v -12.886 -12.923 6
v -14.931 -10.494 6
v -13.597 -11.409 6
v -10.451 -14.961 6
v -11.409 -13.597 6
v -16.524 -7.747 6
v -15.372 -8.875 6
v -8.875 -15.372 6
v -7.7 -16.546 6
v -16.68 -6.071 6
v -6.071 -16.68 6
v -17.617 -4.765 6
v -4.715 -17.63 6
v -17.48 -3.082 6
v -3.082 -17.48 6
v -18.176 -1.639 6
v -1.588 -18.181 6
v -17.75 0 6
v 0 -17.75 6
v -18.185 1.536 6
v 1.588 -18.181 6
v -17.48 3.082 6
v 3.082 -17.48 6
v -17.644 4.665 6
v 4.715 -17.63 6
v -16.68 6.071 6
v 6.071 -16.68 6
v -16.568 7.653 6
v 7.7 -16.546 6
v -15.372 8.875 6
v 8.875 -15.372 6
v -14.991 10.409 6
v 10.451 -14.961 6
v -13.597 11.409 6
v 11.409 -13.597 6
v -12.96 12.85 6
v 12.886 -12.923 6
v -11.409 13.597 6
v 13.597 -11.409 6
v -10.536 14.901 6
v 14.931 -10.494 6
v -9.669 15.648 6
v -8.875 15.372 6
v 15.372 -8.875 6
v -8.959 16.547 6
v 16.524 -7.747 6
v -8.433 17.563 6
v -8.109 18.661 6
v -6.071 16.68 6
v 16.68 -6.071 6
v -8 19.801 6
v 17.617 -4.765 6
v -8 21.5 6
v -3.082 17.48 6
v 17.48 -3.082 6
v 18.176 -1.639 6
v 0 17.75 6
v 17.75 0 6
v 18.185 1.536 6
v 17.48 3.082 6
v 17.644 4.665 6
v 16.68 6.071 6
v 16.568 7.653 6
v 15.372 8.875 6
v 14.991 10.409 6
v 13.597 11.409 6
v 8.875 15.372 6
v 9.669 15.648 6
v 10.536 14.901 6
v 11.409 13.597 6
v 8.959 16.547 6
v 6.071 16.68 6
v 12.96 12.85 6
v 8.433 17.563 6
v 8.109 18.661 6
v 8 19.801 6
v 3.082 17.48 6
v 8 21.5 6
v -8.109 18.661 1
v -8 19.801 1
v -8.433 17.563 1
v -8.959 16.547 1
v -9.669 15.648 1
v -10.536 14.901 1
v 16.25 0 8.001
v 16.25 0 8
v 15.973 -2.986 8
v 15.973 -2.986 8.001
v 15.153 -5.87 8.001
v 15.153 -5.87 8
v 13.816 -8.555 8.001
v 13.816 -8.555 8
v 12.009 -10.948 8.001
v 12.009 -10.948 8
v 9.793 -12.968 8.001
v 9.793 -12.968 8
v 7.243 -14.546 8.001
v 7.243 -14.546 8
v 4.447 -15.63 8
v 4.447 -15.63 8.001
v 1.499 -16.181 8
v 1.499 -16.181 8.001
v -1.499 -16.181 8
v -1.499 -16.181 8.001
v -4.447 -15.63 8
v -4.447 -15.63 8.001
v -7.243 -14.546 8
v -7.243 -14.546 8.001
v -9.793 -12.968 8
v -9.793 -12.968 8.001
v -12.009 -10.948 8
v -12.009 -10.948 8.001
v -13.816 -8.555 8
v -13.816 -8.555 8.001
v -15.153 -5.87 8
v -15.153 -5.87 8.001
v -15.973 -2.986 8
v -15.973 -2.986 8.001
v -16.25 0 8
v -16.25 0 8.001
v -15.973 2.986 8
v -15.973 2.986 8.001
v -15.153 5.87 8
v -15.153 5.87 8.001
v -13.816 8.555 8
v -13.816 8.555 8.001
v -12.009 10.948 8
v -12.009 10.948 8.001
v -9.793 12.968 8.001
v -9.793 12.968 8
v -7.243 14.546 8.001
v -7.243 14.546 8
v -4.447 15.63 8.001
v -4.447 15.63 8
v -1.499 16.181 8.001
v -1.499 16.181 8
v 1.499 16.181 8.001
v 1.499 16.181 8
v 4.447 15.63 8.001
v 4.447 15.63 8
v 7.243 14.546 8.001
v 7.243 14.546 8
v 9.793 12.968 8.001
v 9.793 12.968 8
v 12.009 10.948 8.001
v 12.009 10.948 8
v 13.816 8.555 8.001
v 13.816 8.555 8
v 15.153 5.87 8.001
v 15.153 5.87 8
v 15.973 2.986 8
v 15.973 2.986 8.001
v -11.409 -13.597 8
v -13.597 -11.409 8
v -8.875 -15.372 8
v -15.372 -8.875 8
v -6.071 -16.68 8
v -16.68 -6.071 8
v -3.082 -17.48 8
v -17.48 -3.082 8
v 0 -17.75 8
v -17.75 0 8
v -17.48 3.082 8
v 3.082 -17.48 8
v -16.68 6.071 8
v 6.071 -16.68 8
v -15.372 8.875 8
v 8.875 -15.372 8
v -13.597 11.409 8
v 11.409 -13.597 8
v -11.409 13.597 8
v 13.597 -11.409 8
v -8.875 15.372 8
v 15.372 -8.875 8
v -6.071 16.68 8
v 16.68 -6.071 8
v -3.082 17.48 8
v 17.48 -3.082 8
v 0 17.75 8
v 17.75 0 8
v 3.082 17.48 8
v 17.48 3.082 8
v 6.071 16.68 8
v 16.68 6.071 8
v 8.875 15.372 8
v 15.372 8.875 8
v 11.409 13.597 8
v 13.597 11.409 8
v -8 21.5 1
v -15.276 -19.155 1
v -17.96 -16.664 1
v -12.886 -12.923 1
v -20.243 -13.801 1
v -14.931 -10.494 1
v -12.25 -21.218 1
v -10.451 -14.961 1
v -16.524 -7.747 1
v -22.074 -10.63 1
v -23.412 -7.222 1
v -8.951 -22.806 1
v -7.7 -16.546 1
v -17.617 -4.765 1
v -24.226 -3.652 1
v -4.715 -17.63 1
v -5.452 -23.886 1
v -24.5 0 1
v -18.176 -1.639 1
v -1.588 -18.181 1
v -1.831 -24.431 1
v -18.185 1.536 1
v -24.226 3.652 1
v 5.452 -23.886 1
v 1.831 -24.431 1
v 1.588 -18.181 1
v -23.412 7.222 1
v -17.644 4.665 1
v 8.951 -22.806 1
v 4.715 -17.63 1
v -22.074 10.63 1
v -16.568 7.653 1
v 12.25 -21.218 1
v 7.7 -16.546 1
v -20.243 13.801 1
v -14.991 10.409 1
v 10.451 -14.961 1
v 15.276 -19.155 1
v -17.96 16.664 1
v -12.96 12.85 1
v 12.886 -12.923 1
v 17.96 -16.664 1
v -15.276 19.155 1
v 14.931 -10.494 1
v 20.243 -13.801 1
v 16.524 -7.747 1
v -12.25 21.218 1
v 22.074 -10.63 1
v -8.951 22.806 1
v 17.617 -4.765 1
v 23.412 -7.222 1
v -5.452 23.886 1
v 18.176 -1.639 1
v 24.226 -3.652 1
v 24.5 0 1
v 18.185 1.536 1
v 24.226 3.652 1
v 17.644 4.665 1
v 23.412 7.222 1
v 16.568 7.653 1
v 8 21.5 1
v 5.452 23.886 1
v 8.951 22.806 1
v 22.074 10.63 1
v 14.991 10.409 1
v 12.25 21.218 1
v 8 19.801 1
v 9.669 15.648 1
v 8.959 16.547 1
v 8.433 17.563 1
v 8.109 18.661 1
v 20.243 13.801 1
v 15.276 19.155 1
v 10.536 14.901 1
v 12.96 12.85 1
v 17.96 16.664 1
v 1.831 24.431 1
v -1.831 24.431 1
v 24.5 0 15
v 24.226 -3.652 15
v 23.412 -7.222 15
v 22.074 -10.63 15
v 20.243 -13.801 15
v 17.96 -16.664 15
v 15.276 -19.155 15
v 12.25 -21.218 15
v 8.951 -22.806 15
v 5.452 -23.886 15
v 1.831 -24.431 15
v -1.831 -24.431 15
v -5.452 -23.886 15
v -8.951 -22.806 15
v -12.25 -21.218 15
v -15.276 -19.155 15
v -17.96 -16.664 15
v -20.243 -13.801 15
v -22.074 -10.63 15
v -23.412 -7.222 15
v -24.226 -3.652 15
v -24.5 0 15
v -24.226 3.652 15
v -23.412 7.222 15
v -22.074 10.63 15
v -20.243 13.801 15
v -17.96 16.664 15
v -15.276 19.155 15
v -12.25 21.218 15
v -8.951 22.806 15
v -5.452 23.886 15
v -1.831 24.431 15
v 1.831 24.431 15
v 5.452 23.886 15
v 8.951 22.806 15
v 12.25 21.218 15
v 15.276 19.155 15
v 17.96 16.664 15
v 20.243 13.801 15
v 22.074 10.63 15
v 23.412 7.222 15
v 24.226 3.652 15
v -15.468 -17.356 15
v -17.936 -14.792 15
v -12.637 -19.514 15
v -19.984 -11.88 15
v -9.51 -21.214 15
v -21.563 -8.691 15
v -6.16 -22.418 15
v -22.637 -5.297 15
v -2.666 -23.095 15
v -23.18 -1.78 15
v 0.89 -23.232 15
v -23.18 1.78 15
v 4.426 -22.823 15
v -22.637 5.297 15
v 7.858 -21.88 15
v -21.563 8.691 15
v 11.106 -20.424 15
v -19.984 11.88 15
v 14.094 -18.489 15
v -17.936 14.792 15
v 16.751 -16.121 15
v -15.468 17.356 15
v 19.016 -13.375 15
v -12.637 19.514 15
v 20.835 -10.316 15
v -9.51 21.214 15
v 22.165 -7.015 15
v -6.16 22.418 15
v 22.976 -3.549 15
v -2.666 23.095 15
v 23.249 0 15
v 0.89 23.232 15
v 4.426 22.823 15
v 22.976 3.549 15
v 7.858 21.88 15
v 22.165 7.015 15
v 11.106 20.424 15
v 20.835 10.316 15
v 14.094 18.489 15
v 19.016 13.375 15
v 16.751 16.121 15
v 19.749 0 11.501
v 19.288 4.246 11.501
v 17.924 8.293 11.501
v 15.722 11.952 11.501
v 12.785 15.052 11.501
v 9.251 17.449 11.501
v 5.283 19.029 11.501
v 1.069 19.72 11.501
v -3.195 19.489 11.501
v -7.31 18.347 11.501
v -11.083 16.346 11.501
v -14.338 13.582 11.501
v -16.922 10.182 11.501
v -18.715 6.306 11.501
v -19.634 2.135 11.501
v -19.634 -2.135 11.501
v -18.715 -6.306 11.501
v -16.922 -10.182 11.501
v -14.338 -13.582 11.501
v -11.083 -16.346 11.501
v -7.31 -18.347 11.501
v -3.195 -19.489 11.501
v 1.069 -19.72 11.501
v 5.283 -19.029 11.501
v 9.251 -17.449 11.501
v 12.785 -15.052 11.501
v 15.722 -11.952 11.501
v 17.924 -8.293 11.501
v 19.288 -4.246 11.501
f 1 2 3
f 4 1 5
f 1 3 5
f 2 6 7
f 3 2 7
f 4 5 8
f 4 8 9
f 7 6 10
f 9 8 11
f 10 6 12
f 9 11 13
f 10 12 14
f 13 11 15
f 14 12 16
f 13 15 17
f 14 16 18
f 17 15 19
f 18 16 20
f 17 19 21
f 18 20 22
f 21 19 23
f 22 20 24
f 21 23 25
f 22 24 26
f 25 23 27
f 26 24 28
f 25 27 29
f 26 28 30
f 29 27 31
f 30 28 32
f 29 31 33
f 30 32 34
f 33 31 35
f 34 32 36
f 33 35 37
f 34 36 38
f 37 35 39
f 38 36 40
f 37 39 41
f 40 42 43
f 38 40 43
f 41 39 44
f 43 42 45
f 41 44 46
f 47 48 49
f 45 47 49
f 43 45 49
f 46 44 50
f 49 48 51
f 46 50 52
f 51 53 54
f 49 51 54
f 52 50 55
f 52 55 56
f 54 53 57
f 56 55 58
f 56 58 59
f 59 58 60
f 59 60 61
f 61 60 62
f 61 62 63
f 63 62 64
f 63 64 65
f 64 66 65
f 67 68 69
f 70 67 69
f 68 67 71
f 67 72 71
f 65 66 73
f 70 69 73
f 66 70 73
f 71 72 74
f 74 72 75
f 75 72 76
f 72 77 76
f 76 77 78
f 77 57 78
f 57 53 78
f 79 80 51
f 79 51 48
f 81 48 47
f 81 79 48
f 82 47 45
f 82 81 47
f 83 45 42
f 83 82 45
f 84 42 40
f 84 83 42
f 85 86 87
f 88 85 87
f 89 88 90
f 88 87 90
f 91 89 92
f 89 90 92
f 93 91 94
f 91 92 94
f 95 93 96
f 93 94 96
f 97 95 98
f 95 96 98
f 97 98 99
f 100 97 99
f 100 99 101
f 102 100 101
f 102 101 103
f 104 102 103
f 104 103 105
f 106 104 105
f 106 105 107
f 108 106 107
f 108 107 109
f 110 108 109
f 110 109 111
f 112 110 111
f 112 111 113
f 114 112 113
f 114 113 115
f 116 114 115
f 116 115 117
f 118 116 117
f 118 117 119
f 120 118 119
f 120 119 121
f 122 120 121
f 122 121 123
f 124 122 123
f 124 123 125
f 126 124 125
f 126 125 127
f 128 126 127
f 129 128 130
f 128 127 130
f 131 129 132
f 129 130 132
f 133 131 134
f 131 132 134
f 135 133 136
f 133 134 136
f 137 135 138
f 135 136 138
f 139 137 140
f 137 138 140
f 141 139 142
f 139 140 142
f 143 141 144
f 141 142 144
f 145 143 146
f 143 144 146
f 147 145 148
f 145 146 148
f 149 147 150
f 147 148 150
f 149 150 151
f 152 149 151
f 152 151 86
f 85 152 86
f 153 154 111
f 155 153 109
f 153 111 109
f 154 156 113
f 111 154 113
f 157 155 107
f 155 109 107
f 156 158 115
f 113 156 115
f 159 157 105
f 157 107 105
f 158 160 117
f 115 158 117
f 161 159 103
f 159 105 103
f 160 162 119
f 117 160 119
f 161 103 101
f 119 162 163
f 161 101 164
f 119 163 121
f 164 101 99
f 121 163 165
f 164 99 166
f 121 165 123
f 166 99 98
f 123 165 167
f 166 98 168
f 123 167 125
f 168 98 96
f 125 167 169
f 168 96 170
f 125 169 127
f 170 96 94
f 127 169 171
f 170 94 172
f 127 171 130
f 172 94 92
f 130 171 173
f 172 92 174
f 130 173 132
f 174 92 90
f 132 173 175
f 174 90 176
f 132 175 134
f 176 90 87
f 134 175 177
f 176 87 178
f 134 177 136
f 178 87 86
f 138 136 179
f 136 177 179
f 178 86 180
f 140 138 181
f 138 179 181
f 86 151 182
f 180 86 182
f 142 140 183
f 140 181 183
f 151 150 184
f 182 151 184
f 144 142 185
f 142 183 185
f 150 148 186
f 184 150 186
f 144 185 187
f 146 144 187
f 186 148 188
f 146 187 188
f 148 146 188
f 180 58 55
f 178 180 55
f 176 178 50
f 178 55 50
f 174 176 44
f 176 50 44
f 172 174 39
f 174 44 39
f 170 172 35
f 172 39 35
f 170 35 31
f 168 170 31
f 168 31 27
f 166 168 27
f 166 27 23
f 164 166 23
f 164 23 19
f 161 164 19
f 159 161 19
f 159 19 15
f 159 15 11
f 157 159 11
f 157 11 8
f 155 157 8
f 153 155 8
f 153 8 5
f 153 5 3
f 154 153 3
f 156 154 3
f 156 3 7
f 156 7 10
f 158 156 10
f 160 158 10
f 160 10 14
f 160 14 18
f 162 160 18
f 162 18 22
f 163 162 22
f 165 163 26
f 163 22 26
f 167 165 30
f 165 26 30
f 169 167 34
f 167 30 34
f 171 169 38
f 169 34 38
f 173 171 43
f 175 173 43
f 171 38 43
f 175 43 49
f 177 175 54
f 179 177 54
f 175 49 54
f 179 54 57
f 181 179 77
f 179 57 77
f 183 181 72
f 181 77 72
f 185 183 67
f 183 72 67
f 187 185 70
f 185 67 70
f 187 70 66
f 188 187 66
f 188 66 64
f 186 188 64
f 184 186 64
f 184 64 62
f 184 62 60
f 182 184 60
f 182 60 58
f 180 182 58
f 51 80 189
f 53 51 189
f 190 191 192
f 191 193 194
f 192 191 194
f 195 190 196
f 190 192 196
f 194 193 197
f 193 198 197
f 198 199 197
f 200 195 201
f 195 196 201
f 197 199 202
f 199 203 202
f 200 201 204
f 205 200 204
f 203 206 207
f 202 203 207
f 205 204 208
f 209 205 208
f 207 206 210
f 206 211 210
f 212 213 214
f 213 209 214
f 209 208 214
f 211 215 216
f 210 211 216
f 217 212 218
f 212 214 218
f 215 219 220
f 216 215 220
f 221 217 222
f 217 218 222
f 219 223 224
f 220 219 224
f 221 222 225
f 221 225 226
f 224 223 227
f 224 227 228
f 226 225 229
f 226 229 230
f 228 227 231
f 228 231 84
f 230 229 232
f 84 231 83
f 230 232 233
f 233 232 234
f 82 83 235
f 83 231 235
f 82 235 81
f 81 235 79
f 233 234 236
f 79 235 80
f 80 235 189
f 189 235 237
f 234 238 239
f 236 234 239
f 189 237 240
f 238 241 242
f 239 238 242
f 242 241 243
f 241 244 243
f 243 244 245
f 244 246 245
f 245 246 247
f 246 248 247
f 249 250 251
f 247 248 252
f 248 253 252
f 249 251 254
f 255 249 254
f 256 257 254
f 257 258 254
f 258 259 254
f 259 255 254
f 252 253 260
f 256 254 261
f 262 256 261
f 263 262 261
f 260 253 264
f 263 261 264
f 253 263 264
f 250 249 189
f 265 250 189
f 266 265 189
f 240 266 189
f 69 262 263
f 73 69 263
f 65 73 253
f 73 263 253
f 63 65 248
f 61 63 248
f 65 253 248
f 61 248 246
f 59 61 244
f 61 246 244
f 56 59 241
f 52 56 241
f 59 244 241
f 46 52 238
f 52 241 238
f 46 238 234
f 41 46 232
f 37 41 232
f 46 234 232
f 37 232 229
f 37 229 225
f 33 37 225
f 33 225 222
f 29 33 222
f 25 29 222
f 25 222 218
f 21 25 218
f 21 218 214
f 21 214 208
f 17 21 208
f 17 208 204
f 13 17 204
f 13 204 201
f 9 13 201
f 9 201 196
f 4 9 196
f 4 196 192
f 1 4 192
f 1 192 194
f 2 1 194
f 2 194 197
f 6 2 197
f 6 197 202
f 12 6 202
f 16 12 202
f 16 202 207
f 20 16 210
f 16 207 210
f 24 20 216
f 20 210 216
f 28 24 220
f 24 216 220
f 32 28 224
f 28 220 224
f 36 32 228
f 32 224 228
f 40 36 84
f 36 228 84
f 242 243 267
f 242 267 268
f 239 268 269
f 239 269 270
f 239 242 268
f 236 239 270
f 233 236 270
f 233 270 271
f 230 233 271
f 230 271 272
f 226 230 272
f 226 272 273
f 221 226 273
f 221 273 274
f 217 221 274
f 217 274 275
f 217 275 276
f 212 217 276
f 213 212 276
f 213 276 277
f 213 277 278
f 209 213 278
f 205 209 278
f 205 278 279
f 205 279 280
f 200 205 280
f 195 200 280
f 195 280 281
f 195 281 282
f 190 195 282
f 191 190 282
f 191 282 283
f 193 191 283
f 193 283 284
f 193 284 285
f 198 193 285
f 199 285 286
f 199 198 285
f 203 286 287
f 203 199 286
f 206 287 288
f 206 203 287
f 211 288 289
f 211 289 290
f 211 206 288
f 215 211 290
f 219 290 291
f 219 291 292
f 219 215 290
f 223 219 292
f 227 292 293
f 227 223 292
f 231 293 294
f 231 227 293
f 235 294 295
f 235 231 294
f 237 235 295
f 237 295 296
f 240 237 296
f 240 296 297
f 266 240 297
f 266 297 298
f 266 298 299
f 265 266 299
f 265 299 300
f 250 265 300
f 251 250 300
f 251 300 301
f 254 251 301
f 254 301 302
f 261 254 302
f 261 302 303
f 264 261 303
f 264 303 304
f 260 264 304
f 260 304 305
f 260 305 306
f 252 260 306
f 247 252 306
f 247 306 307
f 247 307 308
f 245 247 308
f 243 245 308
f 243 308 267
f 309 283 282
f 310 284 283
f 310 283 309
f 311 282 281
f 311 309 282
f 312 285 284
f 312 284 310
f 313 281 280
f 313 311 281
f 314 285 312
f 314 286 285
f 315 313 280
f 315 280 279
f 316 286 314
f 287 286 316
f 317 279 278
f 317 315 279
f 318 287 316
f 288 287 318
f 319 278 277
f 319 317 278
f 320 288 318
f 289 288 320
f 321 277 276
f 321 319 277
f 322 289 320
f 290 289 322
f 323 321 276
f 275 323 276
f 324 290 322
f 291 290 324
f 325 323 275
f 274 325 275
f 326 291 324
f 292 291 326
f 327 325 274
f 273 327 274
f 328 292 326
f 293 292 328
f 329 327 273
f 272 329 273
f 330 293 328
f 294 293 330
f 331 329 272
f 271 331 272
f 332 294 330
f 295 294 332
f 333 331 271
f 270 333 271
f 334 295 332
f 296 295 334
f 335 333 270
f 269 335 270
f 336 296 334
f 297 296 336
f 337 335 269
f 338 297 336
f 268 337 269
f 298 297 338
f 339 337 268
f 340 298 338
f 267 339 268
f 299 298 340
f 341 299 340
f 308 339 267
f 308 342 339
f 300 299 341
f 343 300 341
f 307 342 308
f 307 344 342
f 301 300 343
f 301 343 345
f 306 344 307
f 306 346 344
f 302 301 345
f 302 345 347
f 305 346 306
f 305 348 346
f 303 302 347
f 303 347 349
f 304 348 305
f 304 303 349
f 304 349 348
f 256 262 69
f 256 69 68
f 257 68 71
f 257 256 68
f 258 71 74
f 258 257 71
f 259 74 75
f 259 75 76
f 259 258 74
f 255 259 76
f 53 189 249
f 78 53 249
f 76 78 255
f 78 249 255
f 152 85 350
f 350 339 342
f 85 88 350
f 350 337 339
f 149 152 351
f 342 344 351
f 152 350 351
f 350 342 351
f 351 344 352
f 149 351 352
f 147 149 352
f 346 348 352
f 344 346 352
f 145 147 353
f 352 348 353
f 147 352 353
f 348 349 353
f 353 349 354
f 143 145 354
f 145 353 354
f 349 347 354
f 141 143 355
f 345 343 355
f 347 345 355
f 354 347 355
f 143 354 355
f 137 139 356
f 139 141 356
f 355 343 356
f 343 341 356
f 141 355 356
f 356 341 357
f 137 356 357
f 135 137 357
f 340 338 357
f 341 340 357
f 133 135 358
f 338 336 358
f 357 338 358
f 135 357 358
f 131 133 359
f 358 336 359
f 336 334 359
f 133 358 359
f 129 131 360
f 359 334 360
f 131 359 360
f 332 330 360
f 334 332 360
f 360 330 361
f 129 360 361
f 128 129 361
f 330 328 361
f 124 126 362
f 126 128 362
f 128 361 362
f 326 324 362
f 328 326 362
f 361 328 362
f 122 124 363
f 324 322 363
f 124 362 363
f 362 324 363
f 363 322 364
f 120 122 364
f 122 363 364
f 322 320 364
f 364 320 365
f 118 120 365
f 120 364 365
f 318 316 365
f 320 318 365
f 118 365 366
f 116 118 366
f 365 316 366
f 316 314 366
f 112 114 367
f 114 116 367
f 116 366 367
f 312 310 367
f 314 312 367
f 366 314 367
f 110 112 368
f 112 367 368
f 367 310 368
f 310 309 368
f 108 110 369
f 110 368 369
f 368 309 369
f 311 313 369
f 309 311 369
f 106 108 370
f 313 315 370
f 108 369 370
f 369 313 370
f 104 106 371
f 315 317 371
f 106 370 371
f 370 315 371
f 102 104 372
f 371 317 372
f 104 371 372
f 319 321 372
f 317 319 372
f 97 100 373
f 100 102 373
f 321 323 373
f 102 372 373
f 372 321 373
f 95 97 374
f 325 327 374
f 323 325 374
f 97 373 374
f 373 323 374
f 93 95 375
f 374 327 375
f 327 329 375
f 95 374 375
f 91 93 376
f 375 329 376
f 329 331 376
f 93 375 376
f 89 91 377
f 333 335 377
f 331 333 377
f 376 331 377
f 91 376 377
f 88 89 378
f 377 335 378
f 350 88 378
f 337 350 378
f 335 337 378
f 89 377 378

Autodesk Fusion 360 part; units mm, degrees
sketch "Sketch1" plane through (0, 0, 0) normal (0, 0, 1) x (1, 0, 0)
  circle A0 centre (0, 0) radius 18.25
  circle A1 centre (0, 0) radius 24.5
  circle A2 centre (0, 0) radius 17.75
  circle A3 centre (0, 0) radius 16.25
  dimension "d1" = 36.5
  dimension "d2" = 49
  dimension "d7" = 35.5
  dimension "d27" = 32.5
extrude "Extrude1" add sketch "Sketch1" along normal blind 15 contours A0 | A1 | A2
extrude "Extrude6" cut sketch "Sketch1" along normal blind 8 contours A2
extrude "Extrude2" cut sketch "Sketch1" along normal blind 6 contours A0
sketch "Sketch5" plane through (0, 0, 0) normal (0, 0, 1) x (1, 0, 0)
  line L0 (-8, 21.5) -> (8, 21.5)
  line L1 (8, 21.5) -> (8, 19.8006)
  line L2 (8, -21.5) -> (-8, -21.5)
  line L3 (-8, 19.8006) -> (-8, 21.5)
  line L4 (-8, 21.5) -> (8, -21.5) construction
  line L5 (8, 21.5) -> (-8, -21.5) construction
  circle A0 centre (0, 0) radius 18.25
  arc A1 (-10.5361, 14.9015) -> (10.5361, 14.9015) centre (0, 0) ccw
  arc A2 (8, 19.8006) -> (10.5361, 14.9015) centre (14, 19.8006) ccw
  arc A3 (-10.5361, 14.9015) -> (-8, 19.8006) centre (-14, 19.8006) ccw
  dimension "d31" = 16
  dimension "d32" = 43
  dimension "d33" = 6
  dimension "d34" = 6
extrude "Extrude7" cut sketch "Sketch5" along normal blind 6 contours L0 L1 L3 A0 A2 A3
chamfer "Chamfer3" distance 7 angle 45 1 edges at (-15.1503, 5.8763, 15)
move_face "OffsetFaces1" offset -1 1 faces at (0, -22.371, 0)
